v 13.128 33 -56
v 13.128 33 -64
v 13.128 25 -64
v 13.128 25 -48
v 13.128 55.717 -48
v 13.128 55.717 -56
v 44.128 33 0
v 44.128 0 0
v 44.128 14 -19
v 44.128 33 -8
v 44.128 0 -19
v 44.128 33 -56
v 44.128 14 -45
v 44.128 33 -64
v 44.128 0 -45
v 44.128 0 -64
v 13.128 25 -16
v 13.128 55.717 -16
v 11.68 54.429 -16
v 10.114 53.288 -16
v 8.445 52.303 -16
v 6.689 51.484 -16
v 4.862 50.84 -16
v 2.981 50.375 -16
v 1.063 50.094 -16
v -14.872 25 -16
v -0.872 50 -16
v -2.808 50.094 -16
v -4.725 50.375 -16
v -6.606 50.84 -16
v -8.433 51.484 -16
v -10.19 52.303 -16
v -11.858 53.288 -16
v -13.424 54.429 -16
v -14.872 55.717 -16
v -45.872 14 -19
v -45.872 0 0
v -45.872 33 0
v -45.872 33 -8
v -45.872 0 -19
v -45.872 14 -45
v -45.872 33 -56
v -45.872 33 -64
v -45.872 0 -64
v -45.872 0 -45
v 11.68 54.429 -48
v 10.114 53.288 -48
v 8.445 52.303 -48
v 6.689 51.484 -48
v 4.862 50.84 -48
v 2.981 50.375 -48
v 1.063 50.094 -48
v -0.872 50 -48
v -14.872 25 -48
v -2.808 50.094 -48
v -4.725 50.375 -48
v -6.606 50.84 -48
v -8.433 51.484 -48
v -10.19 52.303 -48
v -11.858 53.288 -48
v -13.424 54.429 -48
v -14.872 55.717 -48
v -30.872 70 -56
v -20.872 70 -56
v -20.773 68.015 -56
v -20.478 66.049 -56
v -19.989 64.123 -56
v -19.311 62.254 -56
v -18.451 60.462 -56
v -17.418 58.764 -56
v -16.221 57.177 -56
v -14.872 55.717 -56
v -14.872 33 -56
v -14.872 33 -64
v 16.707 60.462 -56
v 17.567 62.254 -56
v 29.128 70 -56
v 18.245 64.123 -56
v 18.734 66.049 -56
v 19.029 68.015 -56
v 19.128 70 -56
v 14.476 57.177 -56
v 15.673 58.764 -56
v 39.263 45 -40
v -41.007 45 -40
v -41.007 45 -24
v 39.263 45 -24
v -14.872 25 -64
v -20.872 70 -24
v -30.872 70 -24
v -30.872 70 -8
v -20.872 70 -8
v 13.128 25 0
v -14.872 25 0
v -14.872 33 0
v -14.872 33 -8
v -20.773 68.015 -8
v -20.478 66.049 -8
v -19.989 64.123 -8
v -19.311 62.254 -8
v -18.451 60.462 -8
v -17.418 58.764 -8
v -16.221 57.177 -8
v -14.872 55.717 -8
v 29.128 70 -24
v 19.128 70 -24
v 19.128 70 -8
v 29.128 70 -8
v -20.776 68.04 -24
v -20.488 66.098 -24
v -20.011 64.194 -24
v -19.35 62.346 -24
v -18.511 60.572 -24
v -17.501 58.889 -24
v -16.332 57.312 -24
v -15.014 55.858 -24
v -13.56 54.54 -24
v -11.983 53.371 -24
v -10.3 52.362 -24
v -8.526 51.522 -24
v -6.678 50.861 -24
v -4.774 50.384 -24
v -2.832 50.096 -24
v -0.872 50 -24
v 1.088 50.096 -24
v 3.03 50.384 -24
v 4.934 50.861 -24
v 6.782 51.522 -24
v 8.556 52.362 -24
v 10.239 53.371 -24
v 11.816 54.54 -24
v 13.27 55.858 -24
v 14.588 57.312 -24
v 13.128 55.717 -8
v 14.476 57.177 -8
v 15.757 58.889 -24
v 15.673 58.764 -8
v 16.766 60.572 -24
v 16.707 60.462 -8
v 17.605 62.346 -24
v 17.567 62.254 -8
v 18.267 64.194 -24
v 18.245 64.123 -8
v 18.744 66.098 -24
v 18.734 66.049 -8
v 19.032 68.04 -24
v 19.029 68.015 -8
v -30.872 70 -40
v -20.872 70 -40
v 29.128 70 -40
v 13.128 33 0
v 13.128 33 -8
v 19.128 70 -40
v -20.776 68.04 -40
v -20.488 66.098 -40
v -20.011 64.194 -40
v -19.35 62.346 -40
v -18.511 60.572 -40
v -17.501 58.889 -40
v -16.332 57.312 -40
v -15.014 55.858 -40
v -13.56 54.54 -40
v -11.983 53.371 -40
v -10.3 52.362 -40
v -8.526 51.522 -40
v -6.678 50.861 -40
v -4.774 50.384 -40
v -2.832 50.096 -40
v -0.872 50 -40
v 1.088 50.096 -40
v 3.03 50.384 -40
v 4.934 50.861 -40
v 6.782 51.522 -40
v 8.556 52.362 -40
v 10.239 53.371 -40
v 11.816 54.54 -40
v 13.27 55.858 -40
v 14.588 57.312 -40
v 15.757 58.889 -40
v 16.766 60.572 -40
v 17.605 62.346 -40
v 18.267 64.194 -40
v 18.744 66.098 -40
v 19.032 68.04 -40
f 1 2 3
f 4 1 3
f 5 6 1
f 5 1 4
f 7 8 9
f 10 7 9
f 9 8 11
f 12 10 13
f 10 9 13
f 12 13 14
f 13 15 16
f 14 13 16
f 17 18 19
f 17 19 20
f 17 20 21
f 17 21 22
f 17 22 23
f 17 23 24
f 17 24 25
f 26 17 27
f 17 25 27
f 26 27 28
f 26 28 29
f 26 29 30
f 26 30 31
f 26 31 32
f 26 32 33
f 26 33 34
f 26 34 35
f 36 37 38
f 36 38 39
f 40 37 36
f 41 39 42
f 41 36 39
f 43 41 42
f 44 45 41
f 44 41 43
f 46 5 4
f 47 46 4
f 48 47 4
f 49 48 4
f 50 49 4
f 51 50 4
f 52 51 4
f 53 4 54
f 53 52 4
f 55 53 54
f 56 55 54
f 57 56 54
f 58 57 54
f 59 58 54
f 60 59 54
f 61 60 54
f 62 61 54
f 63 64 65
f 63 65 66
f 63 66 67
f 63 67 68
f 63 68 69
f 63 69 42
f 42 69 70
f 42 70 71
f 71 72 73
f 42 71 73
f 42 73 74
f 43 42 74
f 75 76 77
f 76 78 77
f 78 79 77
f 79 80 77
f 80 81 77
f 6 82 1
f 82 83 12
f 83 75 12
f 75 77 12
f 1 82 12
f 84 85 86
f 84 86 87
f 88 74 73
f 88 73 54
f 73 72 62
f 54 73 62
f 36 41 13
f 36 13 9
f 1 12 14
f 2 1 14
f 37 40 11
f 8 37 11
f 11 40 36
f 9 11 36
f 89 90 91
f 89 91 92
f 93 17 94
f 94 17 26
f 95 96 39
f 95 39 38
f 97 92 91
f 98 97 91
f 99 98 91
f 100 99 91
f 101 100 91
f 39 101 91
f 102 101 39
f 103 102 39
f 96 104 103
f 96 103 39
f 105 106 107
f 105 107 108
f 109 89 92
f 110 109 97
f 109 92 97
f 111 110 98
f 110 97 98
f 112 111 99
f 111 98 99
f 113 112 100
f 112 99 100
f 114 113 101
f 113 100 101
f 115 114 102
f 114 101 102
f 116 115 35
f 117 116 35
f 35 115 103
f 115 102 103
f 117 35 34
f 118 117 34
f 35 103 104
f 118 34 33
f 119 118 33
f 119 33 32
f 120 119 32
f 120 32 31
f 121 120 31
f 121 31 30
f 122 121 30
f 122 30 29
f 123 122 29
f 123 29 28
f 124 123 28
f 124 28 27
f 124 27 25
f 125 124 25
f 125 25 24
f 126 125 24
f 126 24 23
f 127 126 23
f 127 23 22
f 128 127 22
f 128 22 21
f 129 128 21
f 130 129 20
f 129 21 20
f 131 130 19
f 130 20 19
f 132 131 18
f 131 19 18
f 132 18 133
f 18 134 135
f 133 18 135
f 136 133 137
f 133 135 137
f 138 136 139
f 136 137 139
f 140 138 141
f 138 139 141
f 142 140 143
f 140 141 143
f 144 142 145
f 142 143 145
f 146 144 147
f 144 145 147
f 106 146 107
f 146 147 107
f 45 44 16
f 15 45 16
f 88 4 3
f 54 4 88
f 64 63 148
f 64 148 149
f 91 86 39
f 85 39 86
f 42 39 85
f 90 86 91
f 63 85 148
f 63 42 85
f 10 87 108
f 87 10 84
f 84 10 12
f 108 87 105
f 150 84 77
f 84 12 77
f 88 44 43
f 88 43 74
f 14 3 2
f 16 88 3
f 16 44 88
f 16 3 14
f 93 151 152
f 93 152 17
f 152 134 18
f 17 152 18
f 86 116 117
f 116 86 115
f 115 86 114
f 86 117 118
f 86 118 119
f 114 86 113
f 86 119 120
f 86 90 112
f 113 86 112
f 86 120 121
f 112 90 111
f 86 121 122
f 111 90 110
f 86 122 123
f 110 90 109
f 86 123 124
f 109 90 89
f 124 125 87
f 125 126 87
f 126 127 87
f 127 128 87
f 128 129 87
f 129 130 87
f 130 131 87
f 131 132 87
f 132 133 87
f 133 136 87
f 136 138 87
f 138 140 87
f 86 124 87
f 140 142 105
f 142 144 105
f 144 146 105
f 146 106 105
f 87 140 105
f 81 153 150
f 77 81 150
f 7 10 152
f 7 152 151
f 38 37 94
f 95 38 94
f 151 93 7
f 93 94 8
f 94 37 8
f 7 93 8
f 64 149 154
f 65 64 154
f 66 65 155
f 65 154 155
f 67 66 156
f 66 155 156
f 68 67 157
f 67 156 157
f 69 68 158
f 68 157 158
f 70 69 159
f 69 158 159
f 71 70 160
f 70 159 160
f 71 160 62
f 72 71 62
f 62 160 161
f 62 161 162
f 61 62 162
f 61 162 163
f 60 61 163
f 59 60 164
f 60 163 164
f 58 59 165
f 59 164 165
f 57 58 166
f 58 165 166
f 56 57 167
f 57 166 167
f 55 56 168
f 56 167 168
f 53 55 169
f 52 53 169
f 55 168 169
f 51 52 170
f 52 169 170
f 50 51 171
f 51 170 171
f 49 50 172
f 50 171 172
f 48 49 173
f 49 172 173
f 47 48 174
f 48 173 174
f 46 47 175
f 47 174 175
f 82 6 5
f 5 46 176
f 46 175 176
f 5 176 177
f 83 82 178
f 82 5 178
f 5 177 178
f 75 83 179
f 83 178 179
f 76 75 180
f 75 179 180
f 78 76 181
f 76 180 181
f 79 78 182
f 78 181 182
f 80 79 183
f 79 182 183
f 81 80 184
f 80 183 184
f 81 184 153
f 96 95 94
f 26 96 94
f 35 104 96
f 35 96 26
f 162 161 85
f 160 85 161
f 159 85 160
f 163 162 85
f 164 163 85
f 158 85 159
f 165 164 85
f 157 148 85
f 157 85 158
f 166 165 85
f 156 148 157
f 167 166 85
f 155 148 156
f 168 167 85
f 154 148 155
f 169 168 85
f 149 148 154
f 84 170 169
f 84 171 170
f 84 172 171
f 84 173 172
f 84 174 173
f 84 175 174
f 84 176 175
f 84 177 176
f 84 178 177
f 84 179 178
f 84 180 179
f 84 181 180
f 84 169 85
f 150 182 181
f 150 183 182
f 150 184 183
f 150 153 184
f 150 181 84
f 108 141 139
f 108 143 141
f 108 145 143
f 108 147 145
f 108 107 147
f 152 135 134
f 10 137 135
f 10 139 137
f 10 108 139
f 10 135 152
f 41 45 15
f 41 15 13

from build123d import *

# Parameters (mm, degrees)
SKETCH1_W           = 90
SKETCH1_H           = 64
BOSS_EXTRUDE1_DEPTH = 70
SKETCH2_W           = 26
SKETCH2_H           = 14
CUT_EXTRUDE1_DEPTH  = 90
CUT_EXTRUDE3_START  = -91
CUT_EXTRUDE3_DEPTH  = 92
SKETCH7_R           = 20
CUT_EXTRUDE4_DEPTH  = 48
CUT_EXTRUDE5_START  = -57
CUT_EXTRUDE5_DEPTH  = 66
SKETCH11_W          = 90
SKETCH11_H          = 16
CUT_EXTRUDE7_DEPTH  = 25
SKETCH13_W          = 28
SKETCH13_H          = 16
CUT_EXTRUDE8_DEPTH  = 45


with BuildPart() as part:
    # Sketch1 → Boss-Extrude1 (new body)
    with BuildSketch(Plane(origin=(0, 0, 0), x_dir=(1, 0, 0), z_dir=(0, 1, 0))):
        with Locations((-0.872093023, 32)):
            Rectangle(SKETCH1_W, SKETCH1_H)
    extrude(amount=BOSS_EXTRUDE1_DEPTH)

    # Sketch2 → Cut-Extrude1 (cut)
    with BuildSketch(Plane.ZY.offset(45.872093023)):
        with Locations((-32, 7)):
            Rectangle(SKETCH2_W, SKETCH2_H)
    extrude(amount=-CUT_EXTRUDE1_DEPTH, mode=Mode.SUBTRACT)

    # Sketch3 → Cut-Extrude3 (cut)
    with BuildSketch(Plane.ZY.offset(45.872093023).offset(CUT_EXTRUDE3_START)):
        Polygon((189.287478648, 33), (0, 33), (-8, 33), (-8, 70), (-8, 259.287478648), (277.352473671, 508.070444427), (474.639952319, 281.782965778), align=None)
    cut_extrude3 = extrude(amount=CUT_EXTRUDE3_DEPTH, mode=Mode.SUBTRACT)

    # Mirror2: Cut-Extrude3 across plane
    add(cut_extrude3.mirror(Plane(origin=(0, 0, -32), x_dir=(1, 0, 0), z_dir=(0, 0, -1))), mode=Mode.SUBTRACT)

    # Sketch7 → Cut-Extrude4 (cut)
    with BuildSketch(Plane.XY.offset(-8)):
        with Locations((-0.872093023, 70)):
            Circle(SKETCH7_R)
    extrude(amount=-CUT_EXTRUDE4_DEPTH, mode=Mode.SUBTRACT)

    # Sketch8 → Cut-Extrude5 (cut)
    with BuildSketch(Plane.XY.offset(-8).offset(CUT_EXTRUDE5_START)):
        Polygon((-126.717387311, -166.418392575), (-45.872093023, 33), (-30.872093023, 70), (49.973201264, 269.418392575), (-348.863583887, 431.10898115), (-525.554172461, -4.727804001), align=None)
    cut_extrude5 = extrude(amount=CUT_EXTRUDE5_DEPTH, mode=Mode.SUBTRACT)

    # Mirror3: Cut-Extrude5 across plane
    add(cut_extrude5.mirror(Plane(origin=(-0.872093023, 0, 0), x_dir=(0, 0, 1), z_dir=(1, 0, 0))), mode=Mode.SUBTRACT)

    # Sketch11 → Cut-Extrude7 (cut)
    with BuildSketch(Plane(origin=(0, 70, 0), x_dir=(1, 0, 0), z_dir=(0, 1, 0))):
        with Locations((-0.872093023, 32)):
            Rectangle(SKETCH11_W, SKETCH11_H)
    extrude(amount=-CUT_EXTRUDE7_DEPTH, mode=Mode.SUBTRACT)

    # Sketch13 → Cut-Extrude8 (cut)
    with BuildSketch(Plane(origin=(0, 70, 0), x_dir=(-1, 0, 0), z_dir=(0, -1, 0))):
        with Locations((0.872093023, 8)):
            Rectangle(SKETCH13_W, SKETCH13_H)
    cut_extrude8 = extrude(amount=CUT_EXTRUDE8_DEPTH, mode=Mode.SUBTRACT)

    # Mirror4: Cut-Extrude8 across plane
    add(cut_extrude8.mirror(Plane(origin=(0, 0, -32), x_dir=(1, 0, 0), z_dir=(0, 0, -1))), mode=Mode.SUBTRACT)


solid = part.part
